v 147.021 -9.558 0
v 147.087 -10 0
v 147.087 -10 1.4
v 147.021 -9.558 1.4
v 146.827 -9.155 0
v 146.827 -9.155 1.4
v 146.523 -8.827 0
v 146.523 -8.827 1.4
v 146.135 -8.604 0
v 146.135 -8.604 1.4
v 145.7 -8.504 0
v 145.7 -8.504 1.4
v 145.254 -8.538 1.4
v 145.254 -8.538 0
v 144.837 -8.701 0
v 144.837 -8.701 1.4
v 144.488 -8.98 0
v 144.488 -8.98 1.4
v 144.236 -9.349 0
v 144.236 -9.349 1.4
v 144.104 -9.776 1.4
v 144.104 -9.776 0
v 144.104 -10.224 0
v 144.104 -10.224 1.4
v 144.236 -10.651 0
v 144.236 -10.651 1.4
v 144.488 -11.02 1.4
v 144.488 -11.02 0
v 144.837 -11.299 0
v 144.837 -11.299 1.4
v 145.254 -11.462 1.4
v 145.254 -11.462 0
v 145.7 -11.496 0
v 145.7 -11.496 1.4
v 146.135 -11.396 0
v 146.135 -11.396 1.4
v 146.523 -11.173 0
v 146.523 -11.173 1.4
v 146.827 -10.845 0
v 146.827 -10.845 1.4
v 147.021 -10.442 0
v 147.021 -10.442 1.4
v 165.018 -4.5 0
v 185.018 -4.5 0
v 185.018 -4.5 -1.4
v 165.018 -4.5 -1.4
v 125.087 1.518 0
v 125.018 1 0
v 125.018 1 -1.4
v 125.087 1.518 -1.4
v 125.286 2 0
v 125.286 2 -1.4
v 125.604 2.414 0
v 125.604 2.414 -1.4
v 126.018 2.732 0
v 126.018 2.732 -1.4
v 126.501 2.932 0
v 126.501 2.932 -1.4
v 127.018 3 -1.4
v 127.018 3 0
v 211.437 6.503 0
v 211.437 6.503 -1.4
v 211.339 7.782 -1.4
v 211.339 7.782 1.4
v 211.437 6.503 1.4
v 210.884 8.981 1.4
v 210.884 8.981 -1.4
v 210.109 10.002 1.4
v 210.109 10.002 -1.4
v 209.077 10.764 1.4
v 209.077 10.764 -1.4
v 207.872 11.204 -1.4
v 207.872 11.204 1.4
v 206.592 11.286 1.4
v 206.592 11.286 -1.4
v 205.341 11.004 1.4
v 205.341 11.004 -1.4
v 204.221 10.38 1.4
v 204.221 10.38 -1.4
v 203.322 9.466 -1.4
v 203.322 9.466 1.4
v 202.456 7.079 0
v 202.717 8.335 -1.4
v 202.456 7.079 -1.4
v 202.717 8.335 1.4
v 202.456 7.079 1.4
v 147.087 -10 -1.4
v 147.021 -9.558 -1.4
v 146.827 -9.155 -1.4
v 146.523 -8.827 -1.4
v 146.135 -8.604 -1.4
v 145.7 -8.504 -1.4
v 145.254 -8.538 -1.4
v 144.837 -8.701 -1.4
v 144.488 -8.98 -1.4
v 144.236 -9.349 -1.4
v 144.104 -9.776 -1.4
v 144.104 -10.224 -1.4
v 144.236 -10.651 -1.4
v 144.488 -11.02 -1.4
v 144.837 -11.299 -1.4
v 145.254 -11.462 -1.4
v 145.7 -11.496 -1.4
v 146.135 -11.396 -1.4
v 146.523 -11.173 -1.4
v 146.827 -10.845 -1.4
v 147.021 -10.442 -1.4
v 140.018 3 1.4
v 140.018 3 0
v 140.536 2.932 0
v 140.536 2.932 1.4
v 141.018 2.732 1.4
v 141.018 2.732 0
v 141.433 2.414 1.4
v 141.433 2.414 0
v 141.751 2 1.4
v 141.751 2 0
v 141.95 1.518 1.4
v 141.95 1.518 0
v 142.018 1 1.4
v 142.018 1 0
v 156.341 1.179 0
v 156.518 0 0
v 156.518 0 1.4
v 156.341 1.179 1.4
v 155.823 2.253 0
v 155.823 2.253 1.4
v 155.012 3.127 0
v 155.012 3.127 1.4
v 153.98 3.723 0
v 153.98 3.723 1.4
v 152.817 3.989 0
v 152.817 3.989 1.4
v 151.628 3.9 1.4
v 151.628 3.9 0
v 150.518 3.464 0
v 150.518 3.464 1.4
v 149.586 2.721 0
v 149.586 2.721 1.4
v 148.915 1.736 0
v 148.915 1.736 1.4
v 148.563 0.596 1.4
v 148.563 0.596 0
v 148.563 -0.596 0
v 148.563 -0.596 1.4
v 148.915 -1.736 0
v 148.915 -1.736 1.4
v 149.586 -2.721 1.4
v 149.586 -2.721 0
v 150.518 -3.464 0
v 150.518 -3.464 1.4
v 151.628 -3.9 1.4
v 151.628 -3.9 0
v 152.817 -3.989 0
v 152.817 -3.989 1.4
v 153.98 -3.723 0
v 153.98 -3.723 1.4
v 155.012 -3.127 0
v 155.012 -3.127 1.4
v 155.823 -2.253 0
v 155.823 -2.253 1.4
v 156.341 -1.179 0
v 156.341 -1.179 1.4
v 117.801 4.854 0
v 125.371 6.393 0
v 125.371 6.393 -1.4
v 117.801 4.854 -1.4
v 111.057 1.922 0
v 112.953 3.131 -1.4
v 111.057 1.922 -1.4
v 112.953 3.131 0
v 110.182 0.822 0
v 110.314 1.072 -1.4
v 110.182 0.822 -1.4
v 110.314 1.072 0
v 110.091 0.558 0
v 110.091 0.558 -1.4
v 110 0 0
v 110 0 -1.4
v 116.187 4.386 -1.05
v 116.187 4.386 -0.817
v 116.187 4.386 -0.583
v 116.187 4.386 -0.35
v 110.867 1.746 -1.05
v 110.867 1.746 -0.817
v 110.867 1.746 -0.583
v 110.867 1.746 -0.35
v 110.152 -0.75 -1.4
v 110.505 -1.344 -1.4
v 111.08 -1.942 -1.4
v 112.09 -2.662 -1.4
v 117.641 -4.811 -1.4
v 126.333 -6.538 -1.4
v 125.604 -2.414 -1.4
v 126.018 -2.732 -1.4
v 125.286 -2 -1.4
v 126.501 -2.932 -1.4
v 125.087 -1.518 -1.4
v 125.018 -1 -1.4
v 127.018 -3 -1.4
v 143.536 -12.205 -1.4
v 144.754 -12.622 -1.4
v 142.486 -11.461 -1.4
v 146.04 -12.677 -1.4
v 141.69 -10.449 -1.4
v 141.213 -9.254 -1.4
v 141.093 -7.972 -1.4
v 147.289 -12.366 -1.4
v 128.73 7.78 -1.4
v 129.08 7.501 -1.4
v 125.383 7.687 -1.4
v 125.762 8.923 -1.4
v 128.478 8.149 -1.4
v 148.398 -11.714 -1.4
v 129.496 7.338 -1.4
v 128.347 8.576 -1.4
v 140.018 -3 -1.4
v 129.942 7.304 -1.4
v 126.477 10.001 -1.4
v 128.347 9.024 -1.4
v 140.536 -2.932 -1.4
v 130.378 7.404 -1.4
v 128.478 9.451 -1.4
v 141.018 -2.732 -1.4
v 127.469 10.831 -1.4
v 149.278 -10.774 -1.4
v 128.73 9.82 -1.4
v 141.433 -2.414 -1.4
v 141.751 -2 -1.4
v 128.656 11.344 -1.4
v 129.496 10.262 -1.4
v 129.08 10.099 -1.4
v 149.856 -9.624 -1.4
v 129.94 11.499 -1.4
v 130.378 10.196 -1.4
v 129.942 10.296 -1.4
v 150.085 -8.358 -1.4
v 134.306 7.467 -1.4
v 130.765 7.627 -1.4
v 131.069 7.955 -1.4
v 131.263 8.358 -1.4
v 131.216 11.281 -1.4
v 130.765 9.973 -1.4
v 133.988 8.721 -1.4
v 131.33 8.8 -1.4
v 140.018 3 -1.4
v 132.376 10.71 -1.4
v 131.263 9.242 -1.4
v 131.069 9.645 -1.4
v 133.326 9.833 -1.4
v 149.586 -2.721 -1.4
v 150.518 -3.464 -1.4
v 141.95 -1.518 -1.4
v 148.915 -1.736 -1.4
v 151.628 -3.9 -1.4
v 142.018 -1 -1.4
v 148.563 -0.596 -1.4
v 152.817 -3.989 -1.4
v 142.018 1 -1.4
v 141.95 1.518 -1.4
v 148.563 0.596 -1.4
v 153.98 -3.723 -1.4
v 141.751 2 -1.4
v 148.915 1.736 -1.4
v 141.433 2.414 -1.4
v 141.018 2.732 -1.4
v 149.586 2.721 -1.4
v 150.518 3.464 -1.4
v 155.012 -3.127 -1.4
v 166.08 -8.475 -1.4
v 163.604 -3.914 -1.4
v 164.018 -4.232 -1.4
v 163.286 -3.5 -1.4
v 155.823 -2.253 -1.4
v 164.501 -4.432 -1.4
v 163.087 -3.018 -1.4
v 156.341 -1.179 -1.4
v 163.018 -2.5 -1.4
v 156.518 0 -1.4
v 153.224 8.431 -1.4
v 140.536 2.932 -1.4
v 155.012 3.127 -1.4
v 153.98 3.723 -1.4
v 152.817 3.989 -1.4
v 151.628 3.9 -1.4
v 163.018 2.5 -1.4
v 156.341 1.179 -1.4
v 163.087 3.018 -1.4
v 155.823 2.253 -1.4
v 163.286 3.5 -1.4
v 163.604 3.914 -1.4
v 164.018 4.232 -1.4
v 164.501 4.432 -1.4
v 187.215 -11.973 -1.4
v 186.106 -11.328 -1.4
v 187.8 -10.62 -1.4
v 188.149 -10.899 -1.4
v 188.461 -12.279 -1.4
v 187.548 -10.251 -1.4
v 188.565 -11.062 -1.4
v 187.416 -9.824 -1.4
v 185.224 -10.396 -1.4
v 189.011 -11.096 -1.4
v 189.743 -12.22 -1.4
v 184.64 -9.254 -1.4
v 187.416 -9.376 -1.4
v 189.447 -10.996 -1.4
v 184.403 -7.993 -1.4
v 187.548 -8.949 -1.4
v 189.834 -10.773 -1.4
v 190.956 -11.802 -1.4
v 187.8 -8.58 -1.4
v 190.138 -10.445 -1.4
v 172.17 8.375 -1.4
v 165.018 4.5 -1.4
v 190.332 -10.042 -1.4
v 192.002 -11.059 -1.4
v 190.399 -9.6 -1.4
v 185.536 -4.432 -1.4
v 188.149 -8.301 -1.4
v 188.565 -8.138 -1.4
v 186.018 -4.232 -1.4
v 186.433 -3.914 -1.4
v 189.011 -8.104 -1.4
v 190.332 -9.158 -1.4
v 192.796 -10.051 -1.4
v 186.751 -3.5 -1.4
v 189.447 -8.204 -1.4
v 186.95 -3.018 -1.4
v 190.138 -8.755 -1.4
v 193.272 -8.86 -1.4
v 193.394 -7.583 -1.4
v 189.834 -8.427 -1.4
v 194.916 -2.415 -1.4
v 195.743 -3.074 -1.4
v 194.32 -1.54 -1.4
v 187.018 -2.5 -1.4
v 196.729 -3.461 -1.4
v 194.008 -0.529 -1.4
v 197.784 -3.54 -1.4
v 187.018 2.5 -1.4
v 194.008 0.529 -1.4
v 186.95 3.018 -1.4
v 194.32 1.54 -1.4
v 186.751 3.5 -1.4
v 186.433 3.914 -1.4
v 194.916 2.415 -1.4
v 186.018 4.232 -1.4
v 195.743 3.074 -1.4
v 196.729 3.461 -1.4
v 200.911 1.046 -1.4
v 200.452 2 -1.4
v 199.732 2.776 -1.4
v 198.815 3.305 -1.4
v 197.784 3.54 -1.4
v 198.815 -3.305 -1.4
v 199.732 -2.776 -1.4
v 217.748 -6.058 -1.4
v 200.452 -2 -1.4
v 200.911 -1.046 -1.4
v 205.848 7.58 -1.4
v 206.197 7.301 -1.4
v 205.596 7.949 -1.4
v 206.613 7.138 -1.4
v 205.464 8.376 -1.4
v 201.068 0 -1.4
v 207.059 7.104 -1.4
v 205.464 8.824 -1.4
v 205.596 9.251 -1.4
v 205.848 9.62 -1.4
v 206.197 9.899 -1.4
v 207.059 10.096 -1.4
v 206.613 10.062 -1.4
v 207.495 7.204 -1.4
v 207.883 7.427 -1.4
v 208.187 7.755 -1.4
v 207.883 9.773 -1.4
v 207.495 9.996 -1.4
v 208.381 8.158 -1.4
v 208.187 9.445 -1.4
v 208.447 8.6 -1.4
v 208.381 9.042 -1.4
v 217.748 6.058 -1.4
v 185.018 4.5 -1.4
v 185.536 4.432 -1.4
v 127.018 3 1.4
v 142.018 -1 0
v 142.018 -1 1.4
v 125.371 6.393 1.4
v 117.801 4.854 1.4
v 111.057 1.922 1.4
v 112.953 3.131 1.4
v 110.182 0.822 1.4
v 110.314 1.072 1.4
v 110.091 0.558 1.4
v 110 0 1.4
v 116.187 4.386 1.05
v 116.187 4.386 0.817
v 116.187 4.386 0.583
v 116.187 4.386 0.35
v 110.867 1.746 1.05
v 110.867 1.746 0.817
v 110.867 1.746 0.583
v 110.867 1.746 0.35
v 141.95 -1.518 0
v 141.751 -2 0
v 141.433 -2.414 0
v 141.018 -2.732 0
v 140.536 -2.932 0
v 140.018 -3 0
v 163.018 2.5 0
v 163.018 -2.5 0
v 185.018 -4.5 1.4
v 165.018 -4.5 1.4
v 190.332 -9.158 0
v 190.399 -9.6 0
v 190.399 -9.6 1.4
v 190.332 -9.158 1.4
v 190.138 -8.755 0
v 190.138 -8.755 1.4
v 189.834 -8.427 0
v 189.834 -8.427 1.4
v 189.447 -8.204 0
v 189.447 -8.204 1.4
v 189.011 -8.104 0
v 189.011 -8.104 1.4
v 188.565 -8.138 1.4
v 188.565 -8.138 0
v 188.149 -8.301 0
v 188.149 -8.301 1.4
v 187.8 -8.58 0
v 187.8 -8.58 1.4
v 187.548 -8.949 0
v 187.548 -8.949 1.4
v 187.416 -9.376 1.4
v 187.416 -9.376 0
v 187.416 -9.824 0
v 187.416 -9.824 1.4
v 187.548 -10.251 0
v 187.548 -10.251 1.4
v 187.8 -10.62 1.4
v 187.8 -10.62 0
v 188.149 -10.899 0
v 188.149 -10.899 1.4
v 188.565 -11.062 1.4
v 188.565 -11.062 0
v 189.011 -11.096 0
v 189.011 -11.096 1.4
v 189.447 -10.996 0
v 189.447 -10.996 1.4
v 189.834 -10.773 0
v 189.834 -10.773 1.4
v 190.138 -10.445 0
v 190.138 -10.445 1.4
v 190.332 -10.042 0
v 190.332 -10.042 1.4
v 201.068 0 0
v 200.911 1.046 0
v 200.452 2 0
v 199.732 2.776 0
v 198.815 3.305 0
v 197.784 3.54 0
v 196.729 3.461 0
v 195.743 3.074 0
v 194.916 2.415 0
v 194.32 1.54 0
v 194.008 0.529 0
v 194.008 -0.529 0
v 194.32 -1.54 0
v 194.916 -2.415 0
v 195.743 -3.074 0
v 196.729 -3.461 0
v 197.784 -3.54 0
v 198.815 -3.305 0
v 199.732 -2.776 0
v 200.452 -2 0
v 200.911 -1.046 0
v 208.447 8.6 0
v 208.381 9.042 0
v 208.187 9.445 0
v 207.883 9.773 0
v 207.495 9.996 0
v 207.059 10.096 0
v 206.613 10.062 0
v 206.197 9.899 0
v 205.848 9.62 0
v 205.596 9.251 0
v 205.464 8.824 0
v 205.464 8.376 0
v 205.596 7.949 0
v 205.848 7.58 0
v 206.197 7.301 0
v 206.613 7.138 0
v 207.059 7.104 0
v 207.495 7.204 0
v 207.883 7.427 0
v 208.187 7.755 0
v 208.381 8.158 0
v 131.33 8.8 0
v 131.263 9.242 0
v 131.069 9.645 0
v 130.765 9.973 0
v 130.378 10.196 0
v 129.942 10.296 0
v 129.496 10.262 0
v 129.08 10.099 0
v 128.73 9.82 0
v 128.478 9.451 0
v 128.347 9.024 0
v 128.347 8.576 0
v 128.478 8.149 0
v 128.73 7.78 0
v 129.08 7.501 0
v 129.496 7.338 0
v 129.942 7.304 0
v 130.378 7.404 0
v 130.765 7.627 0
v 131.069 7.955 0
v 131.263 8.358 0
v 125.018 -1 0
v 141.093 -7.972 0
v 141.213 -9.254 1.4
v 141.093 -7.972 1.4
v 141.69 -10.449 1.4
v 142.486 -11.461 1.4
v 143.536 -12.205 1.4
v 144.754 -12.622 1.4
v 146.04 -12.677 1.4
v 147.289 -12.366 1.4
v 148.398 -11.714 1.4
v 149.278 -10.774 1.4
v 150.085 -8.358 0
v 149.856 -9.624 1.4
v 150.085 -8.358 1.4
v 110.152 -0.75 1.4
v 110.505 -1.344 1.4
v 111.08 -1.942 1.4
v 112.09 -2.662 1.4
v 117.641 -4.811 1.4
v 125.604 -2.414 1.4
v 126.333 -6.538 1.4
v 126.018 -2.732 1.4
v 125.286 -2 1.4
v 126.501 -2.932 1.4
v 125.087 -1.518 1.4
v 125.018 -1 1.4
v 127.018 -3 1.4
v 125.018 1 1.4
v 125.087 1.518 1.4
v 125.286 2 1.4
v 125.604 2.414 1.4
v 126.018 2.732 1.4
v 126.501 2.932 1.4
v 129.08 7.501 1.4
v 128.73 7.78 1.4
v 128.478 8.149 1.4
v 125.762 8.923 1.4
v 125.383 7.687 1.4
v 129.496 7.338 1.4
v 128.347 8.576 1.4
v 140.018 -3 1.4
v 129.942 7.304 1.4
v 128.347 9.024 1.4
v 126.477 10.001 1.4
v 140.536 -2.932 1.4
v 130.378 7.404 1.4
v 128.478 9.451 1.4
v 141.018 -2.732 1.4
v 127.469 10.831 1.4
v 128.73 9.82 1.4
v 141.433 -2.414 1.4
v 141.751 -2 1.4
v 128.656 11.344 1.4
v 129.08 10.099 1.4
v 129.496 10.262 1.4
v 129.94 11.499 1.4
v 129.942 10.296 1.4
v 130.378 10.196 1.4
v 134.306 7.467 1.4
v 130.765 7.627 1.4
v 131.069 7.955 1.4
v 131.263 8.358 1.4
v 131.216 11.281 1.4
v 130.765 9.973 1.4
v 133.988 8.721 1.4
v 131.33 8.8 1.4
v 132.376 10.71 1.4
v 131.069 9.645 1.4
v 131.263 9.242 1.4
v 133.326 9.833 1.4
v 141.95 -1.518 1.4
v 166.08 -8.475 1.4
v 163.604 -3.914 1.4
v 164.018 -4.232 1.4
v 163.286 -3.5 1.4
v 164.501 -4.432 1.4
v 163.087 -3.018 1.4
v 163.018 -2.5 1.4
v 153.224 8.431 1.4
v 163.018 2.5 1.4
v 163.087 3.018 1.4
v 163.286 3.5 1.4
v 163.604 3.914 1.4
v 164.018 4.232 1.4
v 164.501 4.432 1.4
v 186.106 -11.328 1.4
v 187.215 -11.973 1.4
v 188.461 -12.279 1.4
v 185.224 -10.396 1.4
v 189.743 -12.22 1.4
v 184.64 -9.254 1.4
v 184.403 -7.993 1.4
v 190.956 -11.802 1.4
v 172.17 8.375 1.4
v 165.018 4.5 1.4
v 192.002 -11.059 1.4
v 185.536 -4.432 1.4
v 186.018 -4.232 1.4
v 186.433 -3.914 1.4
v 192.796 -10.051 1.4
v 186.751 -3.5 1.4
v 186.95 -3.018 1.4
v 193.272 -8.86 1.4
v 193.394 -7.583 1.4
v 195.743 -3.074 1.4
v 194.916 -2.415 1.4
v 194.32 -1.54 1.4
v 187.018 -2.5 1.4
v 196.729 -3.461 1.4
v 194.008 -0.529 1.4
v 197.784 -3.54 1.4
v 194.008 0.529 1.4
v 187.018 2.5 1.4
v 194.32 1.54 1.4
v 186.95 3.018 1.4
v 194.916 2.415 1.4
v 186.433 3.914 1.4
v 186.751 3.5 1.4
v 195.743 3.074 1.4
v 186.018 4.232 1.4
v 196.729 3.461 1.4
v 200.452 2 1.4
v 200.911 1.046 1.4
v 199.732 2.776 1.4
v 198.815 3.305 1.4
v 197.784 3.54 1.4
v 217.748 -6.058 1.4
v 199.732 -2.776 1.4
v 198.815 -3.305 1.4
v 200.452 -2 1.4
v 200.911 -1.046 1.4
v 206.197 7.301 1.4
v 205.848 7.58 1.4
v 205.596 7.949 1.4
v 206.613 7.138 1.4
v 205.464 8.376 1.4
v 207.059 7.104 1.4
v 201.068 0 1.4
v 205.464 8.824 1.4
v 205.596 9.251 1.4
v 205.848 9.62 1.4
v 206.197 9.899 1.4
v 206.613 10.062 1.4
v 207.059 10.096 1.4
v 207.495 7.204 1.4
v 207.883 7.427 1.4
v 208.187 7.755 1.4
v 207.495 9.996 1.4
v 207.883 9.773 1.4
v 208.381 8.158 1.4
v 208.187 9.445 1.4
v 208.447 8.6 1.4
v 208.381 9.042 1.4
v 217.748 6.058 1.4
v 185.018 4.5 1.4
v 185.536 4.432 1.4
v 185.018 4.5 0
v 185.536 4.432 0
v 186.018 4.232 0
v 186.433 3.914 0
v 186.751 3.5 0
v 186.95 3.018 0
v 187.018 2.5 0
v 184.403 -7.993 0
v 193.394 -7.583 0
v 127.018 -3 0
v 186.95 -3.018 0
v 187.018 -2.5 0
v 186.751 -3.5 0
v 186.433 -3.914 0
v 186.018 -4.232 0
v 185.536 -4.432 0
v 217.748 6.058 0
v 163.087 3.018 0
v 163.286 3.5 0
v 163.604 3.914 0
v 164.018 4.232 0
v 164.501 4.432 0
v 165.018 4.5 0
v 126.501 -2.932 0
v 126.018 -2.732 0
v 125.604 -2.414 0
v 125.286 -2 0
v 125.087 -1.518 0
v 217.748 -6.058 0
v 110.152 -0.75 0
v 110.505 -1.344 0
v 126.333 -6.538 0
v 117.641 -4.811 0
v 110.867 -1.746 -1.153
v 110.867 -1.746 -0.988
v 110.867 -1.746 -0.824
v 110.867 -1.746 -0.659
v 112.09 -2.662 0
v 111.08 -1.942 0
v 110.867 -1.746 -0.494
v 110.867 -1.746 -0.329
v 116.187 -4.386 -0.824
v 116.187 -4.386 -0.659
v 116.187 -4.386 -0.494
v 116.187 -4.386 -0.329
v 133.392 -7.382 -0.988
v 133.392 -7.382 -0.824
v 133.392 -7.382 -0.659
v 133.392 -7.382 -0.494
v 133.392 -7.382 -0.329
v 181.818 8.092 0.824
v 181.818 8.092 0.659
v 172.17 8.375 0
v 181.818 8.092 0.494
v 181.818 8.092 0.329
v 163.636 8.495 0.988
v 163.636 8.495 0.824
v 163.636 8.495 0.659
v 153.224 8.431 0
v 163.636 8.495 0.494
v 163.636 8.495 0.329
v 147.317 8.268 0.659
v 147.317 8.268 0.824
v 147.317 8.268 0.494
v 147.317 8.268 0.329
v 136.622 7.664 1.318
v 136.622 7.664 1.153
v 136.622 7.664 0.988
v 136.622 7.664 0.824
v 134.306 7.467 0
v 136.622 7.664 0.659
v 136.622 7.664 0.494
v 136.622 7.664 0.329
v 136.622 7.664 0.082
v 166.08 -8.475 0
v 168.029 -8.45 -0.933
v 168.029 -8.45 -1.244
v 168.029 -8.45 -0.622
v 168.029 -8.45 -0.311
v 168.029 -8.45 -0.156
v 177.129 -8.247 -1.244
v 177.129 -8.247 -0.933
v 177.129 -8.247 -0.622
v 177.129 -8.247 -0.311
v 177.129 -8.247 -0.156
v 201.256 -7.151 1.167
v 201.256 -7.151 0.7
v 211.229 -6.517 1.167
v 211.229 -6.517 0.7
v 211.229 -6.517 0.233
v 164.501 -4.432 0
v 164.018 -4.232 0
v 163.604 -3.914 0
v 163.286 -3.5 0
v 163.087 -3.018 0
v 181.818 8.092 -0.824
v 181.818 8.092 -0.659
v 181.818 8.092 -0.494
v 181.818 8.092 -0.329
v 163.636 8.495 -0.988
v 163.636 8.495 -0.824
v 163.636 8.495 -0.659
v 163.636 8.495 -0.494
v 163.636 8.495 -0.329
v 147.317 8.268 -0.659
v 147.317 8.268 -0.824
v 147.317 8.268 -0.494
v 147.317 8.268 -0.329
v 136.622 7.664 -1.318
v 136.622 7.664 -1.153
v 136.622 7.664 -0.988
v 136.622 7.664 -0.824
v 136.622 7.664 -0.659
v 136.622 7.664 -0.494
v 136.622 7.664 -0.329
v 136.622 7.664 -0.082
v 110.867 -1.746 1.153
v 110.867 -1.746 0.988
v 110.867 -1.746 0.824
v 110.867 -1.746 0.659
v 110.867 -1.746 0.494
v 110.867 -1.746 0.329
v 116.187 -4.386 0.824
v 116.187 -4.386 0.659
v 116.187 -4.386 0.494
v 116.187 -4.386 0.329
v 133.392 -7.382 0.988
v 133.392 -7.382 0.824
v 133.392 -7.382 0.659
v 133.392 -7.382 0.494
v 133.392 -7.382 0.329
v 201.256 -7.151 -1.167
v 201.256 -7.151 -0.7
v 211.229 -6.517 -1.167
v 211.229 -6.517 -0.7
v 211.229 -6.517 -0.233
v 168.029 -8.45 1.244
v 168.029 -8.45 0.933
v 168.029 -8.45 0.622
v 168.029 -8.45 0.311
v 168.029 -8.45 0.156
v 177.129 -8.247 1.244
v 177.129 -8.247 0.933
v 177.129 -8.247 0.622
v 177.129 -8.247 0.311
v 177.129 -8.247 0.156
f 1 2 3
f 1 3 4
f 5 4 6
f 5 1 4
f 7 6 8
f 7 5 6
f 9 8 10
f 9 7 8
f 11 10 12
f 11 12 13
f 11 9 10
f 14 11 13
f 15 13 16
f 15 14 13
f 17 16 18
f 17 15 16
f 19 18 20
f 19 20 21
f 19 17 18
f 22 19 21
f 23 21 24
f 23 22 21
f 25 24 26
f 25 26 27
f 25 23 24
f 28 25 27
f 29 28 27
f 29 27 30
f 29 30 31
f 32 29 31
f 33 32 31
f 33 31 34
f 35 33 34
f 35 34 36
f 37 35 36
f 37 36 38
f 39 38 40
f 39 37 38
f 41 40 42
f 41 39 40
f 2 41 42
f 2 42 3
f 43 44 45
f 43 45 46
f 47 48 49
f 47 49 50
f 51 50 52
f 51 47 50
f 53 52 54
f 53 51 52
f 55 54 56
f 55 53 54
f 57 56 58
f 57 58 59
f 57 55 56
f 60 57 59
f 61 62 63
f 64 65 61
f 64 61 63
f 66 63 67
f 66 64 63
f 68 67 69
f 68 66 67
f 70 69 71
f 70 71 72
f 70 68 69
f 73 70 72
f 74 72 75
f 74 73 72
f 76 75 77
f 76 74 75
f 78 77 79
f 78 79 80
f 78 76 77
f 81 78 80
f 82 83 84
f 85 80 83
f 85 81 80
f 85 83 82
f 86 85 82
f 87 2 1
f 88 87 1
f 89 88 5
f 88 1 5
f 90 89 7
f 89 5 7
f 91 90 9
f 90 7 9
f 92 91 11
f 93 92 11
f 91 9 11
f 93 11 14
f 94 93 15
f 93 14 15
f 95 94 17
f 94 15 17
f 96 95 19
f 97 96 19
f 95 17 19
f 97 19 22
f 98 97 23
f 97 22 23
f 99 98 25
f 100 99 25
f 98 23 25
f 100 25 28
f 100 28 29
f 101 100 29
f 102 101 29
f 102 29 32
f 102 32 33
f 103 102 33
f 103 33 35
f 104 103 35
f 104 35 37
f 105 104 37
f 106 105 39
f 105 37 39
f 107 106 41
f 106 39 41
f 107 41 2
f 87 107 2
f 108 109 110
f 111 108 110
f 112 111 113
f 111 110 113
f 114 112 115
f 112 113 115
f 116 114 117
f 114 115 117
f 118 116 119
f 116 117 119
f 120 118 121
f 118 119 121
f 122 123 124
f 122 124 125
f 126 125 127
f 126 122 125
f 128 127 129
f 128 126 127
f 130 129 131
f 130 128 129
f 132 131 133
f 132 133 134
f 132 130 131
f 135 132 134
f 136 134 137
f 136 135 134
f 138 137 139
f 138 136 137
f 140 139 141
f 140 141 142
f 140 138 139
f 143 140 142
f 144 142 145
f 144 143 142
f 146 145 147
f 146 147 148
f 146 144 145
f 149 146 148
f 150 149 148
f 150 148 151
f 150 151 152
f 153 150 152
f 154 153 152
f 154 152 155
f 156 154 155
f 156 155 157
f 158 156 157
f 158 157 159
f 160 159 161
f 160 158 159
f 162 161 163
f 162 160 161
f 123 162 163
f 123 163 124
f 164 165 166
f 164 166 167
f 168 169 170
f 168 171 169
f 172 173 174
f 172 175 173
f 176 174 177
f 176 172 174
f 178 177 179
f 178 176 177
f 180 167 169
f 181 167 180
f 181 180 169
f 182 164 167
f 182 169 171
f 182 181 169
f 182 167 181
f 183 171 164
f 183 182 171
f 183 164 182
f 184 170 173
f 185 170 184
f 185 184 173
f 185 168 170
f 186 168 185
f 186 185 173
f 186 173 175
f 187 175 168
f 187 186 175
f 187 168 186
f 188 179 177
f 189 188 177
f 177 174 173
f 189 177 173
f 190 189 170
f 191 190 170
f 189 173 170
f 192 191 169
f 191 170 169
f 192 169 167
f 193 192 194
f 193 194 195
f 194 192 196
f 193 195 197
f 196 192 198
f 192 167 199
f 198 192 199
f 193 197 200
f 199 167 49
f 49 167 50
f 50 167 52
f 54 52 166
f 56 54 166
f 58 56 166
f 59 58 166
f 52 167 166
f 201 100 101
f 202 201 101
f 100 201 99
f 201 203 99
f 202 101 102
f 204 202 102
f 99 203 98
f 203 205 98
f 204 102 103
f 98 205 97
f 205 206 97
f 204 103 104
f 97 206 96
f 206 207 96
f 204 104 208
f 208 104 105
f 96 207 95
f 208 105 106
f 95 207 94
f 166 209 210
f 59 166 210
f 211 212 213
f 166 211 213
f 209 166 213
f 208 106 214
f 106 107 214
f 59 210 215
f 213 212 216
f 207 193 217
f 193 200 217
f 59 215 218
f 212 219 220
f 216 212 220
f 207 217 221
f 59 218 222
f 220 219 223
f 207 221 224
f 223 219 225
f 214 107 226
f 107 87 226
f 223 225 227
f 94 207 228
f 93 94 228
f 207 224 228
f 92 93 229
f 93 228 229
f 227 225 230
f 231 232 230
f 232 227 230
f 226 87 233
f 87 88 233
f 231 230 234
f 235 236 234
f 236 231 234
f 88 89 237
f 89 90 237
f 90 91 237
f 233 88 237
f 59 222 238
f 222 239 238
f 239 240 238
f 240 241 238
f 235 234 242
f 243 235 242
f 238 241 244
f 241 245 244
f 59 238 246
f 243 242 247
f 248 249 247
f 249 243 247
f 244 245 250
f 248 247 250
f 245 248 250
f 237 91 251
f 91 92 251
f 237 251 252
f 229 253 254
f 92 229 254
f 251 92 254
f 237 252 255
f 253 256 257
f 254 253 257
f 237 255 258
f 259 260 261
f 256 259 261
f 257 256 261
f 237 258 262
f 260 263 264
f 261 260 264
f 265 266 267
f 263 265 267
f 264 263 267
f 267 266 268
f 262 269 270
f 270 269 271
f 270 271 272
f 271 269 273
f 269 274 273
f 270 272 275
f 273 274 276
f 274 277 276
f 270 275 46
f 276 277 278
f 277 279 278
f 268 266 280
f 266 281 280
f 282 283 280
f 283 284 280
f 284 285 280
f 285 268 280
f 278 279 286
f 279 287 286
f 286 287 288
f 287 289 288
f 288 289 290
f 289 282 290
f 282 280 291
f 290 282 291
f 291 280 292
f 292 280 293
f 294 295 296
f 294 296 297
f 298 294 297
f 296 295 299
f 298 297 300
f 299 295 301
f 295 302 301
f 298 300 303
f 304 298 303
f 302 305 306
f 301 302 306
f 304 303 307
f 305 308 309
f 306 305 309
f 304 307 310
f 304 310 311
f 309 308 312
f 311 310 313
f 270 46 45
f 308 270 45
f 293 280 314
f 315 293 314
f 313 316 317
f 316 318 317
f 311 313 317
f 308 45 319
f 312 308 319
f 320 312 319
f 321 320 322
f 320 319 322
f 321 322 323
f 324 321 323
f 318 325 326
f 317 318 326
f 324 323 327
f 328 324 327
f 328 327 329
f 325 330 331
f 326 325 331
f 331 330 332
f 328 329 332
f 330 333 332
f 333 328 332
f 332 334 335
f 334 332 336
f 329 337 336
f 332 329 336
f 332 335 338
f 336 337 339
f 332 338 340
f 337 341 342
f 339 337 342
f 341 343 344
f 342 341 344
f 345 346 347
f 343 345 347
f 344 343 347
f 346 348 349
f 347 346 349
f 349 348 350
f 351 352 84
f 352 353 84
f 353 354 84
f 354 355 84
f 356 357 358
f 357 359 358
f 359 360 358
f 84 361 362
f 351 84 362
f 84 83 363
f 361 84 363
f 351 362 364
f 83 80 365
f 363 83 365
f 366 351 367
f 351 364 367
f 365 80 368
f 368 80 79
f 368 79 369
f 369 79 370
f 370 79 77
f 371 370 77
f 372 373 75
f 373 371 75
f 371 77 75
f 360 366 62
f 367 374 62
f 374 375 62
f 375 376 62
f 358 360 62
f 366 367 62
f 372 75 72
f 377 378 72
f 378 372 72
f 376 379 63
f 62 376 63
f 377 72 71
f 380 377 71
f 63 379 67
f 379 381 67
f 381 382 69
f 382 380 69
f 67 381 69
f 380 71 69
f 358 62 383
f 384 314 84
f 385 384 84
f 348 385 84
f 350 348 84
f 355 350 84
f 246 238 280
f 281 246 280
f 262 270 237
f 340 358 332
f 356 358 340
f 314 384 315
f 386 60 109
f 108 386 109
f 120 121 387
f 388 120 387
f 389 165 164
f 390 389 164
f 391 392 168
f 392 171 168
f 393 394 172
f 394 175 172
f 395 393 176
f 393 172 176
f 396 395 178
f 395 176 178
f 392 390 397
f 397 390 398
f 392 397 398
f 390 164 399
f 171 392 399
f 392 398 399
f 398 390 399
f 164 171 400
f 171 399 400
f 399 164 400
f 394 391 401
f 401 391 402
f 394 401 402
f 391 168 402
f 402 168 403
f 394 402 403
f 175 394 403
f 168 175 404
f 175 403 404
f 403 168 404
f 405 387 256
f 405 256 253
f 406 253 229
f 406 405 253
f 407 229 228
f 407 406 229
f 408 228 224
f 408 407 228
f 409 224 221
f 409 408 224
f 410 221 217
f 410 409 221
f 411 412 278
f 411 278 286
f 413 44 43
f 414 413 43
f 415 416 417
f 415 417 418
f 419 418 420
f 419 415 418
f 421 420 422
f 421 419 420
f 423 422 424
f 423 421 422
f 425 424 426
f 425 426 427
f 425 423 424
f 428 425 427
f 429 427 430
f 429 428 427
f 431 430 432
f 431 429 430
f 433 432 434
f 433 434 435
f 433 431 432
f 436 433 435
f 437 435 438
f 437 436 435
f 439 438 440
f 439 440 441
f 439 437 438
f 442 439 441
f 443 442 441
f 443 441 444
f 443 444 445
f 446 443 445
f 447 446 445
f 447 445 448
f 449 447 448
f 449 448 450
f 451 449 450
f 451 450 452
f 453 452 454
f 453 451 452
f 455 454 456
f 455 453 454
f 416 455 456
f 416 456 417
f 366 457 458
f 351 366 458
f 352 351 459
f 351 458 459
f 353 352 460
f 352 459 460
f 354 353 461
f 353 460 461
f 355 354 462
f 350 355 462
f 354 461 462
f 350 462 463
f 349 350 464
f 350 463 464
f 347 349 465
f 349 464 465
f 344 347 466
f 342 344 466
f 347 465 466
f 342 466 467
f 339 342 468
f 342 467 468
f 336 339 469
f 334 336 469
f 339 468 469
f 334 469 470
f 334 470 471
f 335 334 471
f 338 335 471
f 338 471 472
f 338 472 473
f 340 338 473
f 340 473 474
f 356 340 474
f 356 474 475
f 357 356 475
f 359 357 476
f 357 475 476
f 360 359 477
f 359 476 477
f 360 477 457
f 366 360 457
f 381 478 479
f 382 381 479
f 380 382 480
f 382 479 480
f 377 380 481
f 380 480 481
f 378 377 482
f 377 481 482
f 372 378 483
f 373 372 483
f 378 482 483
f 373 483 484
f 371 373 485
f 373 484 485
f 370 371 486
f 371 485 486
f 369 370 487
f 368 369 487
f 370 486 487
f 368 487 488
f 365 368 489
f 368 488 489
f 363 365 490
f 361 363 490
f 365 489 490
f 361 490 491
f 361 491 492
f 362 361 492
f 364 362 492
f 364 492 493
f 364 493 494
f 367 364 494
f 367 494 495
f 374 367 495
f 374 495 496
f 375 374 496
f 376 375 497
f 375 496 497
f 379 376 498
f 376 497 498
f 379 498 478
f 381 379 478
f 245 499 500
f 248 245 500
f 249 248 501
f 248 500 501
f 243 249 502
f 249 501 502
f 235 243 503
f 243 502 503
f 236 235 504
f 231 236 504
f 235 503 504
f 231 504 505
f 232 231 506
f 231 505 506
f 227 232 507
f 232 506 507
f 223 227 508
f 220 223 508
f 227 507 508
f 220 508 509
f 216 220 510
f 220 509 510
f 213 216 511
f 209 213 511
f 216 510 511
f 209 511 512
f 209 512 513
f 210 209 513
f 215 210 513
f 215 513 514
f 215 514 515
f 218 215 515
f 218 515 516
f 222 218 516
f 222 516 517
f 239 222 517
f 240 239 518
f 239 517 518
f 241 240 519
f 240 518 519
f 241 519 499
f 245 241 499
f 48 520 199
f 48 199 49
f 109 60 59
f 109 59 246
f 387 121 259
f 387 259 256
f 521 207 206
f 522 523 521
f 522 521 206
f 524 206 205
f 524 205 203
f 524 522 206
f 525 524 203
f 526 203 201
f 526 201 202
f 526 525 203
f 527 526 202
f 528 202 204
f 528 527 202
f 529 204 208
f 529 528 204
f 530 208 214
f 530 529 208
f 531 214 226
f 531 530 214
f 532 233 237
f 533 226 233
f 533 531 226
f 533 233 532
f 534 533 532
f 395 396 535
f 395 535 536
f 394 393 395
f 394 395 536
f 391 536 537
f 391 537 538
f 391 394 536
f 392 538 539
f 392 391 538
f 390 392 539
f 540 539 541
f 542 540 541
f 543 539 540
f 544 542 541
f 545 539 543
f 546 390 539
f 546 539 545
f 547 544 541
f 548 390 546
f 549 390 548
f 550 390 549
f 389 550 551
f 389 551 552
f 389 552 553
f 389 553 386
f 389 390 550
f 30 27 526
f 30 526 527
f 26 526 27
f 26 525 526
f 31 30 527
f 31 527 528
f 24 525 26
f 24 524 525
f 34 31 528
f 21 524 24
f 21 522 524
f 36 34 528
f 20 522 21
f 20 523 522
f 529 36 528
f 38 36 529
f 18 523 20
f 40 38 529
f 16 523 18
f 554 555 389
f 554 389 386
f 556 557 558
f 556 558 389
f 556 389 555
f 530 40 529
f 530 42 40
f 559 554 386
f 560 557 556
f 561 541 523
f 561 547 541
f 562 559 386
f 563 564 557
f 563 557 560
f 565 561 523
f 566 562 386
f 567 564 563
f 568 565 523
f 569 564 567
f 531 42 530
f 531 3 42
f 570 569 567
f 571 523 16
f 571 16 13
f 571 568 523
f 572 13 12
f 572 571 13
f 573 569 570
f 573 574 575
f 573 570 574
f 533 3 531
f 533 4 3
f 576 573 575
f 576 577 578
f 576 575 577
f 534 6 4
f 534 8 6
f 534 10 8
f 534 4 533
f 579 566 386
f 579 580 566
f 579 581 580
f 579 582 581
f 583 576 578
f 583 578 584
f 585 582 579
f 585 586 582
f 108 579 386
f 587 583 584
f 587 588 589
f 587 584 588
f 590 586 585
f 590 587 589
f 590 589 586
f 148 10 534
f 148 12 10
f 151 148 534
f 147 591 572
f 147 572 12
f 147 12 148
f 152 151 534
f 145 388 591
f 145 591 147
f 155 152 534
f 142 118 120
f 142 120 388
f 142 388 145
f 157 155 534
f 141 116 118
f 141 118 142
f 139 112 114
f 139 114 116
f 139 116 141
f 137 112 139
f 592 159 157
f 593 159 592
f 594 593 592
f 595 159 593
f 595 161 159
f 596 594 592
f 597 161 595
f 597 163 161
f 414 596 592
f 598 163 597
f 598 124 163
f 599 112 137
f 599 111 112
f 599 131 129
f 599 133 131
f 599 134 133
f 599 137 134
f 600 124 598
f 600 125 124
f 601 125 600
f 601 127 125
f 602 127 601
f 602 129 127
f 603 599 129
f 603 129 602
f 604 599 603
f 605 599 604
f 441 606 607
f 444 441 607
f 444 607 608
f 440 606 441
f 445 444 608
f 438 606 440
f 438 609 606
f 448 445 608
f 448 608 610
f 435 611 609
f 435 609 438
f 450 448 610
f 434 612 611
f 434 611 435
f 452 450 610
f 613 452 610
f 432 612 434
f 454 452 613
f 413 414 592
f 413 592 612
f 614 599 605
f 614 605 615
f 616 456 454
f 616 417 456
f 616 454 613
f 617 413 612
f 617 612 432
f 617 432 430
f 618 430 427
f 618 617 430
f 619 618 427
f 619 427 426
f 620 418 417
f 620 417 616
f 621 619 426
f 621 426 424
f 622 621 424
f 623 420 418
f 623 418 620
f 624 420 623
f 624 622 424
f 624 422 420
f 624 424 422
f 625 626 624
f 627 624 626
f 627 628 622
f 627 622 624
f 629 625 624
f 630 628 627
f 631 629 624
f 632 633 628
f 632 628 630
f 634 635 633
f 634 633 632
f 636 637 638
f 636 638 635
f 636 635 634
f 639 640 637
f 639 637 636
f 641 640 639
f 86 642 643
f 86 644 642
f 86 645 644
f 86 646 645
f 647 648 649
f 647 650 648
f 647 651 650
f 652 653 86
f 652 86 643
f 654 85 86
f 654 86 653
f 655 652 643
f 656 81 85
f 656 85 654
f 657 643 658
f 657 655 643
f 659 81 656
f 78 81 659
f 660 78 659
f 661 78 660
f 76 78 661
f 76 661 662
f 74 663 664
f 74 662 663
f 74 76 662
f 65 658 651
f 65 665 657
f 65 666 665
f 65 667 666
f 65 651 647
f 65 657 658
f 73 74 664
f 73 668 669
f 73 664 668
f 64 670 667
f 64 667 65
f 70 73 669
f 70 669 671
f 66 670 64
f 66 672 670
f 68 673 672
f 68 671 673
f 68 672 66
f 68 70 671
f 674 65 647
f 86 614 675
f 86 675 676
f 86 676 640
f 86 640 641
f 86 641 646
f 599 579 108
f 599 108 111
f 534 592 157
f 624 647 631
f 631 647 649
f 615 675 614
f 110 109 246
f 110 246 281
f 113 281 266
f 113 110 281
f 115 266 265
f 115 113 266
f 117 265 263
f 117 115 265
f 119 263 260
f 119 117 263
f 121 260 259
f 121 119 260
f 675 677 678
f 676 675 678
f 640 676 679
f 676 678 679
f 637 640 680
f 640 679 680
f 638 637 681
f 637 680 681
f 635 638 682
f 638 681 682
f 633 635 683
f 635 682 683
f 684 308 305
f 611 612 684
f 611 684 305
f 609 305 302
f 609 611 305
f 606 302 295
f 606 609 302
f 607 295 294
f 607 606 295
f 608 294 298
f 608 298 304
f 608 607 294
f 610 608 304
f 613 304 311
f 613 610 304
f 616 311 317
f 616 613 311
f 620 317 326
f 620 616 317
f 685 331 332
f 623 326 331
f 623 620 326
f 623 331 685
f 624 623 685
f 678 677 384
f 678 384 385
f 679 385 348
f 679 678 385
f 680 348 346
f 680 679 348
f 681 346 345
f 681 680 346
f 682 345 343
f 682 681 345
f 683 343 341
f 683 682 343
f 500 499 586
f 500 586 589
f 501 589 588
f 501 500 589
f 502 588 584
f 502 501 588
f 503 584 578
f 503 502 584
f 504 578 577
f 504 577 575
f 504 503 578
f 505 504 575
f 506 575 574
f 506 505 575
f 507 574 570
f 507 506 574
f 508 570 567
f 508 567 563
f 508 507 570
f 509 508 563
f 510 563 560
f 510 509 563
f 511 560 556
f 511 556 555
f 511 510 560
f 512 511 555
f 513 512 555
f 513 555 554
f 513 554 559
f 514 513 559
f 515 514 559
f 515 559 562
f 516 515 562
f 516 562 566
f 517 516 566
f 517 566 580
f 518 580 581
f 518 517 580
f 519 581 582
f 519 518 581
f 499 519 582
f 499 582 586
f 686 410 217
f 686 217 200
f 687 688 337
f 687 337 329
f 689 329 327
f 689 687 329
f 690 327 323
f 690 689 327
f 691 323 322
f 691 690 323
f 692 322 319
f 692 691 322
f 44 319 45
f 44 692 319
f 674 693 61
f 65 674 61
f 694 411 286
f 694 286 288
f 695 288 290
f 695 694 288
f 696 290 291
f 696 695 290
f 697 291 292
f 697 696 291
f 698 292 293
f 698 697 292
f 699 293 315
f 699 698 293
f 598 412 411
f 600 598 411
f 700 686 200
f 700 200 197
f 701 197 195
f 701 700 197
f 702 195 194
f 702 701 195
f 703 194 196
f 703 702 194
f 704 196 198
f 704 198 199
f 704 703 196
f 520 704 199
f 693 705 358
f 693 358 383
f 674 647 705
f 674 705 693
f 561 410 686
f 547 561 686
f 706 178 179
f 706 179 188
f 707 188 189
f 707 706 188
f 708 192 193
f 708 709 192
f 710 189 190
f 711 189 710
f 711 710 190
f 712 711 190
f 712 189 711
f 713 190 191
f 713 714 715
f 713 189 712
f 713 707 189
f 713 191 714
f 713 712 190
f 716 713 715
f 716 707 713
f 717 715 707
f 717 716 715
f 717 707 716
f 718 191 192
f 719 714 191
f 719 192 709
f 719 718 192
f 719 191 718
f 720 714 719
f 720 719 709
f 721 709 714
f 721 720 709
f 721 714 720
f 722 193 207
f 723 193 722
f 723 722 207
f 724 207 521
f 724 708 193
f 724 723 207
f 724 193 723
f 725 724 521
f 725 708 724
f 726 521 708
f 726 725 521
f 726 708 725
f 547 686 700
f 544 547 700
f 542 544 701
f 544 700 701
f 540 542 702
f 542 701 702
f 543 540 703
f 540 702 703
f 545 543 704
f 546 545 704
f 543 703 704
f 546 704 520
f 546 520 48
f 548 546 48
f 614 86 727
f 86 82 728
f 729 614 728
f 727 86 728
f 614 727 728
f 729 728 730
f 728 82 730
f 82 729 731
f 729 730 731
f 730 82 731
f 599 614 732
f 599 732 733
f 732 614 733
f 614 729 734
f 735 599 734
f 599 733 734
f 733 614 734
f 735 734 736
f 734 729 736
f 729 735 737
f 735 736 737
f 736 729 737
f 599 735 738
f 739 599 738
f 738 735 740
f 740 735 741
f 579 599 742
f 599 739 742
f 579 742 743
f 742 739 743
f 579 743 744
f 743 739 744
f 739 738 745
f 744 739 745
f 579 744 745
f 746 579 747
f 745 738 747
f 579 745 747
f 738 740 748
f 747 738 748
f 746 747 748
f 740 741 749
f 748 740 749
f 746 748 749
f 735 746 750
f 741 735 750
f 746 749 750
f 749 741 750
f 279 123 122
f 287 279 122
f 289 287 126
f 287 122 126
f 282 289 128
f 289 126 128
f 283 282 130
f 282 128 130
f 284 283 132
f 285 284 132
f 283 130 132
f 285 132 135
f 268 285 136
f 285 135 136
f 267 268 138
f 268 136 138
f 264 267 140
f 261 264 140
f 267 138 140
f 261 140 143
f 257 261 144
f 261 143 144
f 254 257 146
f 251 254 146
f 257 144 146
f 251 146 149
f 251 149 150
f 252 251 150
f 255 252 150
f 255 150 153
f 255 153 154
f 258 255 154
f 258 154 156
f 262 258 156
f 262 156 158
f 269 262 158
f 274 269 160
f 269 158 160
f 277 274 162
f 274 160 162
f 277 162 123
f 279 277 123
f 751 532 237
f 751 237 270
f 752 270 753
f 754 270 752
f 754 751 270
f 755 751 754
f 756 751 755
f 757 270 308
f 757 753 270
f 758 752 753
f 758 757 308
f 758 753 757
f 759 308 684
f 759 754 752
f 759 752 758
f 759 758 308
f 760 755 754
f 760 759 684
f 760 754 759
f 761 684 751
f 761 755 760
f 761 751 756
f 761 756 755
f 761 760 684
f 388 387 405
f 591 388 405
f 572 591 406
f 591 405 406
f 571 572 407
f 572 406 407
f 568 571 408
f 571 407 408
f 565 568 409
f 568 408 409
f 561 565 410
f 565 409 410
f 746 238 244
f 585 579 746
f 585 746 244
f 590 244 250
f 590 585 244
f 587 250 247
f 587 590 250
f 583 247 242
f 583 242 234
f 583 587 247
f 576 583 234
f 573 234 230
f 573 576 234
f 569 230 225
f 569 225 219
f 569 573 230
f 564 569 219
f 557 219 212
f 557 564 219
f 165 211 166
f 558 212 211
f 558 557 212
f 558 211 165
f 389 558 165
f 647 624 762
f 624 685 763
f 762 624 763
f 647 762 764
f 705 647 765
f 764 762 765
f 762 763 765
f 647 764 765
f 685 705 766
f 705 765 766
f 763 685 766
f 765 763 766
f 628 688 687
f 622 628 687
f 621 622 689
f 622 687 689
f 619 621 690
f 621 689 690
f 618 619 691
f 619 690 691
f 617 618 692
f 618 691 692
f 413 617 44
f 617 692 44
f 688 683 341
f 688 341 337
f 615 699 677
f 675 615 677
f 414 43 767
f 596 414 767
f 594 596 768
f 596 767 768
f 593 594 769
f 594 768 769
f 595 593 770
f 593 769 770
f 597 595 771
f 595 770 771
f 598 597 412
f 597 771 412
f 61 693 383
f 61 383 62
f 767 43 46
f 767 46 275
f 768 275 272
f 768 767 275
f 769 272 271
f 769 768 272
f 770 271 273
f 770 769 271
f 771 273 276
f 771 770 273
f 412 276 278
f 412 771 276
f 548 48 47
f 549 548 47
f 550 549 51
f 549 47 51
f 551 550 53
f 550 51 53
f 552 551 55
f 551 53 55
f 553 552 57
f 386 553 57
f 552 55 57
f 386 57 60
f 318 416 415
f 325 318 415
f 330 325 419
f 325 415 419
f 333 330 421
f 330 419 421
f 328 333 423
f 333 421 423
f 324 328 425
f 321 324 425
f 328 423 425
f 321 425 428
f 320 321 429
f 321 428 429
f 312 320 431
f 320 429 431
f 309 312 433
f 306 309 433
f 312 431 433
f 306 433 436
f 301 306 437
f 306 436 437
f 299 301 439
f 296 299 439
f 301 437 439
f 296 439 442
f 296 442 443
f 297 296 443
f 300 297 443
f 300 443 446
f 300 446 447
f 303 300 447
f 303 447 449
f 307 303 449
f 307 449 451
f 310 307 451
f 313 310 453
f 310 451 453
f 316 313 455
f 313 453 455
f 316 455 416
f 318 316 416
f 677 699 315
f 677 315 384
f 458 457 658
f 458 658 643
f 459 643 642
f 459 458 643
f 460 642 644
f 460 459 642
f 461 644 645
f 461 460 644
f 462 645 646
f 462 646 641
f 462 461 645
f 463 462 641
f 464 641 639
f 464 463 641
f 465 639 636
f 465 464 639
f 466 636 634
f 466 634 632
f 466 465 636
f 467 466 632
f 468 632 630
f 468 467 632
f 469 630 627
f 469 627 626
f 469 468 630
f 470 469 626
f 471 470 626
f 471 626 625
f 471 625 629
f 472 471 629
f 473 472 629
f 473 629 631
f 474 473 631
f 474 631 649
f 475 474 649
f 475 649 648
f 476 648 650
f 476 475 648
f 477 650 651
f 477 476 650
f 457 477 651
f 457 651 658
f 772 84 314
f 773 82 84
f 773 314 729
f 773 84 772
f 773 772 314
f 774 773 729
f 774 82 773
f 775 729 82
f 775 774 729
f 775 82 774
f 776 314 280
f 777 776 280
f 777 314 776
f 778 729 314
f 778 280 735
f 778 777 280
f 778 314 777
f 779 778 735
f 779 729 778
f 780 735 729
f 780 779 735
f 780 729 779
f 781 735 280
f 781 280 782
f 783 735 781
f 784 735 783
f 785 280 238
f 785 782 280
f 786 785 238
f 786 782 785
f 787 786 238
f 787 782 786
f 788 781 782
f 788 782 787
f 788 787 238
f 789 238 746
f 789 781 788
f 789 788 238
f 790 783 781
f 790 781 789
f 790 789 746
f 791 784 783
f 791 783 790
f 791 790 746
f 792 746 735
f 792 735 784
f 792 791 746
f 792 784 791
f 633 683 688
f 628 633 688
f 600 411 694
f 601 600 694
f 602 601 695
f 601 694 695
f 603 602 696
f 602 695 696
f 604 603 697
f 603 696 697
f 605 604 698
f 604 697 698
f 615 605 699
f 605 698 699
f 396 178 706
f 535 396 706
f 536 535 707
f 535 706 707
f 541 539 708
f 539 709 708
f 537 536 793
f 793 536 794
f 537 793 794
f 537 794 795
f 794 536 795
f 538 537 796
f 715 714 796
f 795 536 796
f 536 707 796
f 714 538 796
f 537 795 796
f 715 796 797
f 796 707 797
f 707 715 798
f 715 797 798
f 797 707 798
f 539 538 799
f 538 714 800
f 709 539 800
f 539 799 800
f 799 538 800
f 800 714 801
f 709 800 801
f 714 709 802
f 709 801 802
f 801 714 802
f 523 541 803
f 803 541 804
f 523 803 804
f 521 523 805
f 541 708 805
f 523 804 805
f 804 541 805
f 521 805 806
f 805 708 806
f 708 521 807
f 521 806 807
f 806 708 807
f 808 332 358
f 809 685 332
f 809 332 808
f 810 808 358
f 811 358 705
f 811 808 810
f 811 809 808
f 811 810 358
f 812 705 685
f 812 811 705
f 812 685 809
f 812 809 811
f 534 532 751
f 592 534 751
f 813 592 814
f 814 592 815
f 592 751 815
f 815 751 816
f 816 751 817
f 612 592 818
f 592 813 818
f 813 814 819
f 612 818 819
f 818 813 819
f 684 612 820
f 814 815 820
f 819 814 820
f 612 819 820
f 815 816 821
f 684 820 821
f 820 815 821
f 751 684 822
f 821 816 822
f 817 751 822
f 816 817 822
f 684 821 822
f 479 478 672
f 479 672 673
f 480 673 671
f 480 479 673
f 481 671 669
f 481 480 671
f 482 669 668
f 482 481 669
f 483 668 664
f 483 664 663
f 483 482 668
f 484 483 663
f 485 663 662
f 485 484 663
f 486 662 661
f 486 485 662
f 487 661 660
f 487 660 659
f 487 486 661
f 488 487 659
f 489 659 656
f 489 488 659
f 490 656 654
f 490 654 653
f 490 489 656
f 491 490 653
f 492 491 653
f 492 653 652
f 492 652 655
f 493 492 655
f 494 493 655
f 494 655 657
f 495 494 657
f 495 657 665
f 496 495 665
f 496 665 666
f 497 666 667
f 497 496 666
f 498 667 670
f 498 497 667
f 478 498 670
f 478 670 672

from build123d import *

# Parameters (mm, degrees)
SKETCH_1_R      = 1.5
SKETCH_1_R_2    = 4
SKETCH_1_R_3    = 3.55
EXTRUDE_1_DEPTH = 1.4


with BuildPart() as part:
    # Эскиз1 → Бобышка-Вытянуть1 (new, symmetric)
    with BuildSketch(Plane.XY):
        with BuildLine():
            Line((217.747634119, 0), (217.747634119, 6.058113078))
            add(Edge.make_bspline(
                [(217.747634119, 6.058113078), (217.243808474, 6.094887376), (215.140700226, 6.247183834), (213.037224342, 6.394367799), (211.437469318, 6.503148402)],
                knots=[0.362605011, 0.362605011, 0.362605011, 0.362605011, 0.371392651, 0.399285533, 0.399285533, 0.399285533, 0.399285533], degree=3))
            ThreePointArc((211.437469318, 6.503148402), (207.235292618, 11.29077317), (202.455940343, 7.079190122))
            add(Edge.make_bspline(
                [(202.455940343, 7.079190122), (202.056002141, 7.103223291), (200.009450225, 7.225045801), (196.331634567, 7.433105337), (191.441311474, 7.684604439), (186.608700127, 7.906218293), (181.844626933, 8.095958493), (177.159453511, 8.251957682), (172.563150272, 8.372486564), (168.065295924, 8.455953662), (163.675147454, 8.5010027), (159.401643404, 8.506522967), (155.253439756, 8.471528808), (151.238917925, 8.395506076), (147.366223919, 8.277985977), (143.643266298, 8.118975561), (140.077743555, 7.918678943), (136.982380939, 7.699243614), (135.077259612, 7.537606821), (134.305602735, 7.467259257)],
                knots=[0.451472212, 0.451472212, 0.451472212, 0.451472212, 0.458441906, 0.487136113, 0.515551917, 0.543623846, 0.571289984, 0.59849081, 0.625169613, 0.651272029, 0.676746158, 0.701541791, 0.725611017, 0.748907835, 0.771387785, 0.793008139, 0.813728033, 0.833507815, 0.846986731, 0.846986731, 0.846986731, 0.846986731], degree=3))
            ThreePointArc((134.305602735, 7.467259257), (129.292776458, 11.467825954), (125.371042184, 6.393088379))
            add(Edge.make_bspline(
                [(125.371042184, 6.393088379), (125.182557358, 6.363796993), (124.168294515, 6.203402144), (122.397158974, 5.896120566), (120.133109351, 5.434797476), (118.081312133, 4.94256764), (116.247665798, 4.421392386), (114.63793972, 3.873060465), (113.256788366, 3.299309237), (112.109835924, 2.701306387), (111.196336341, 2.078555233), (110.530223642, 1.427069758), (110.085538218, 0.73423022), (110.027578176, 0.23672144), (110, 0)],
                knots=[0.899174702, 0.899174702, 0.899174702, 0.899174702, 0.902492782, 0.917037139, 0.930441054, 0.942679762, 0.953733567, 0.963589785, 0.972247019, 0.979722225, 0.986065145, 0.991385258, 0.995900989, 1, 1, 1, 1], degree=3))
            add(Edge.make_bspline(
                [(110, 0), (110.027578176, -0.236721441), (110.085538218, -0.734230221), (110.530223642, -1.427069759), (111.196336341, -2.078555234), (112.109835924, -2.701306388), (113.256788366, -3.299309238), (114.63793972, -3.873060466), (116.247665798, -4.421392387), (118.081312133, -4.942567641), (120.133109351, -5.434797477), (122.397158974, -5.896120567), (124.867245825, -6.324666078), (127.536961089, -6.718650341), (130.399721686, -7.076424311), (133.448762895, -7.396480569), (136.677139412, -7.677604542), (139.245643336, -7.859689995), (140.736851964, -7.951317752), (141.093175889, -7.972438296)],
                knots=[0, 0, 0, 0, 0.004099011, 0.008614742, 0.013934855, 0.020277775, 0.027752981, 0.036410215, 0.046266433, 0.057320238, 0.069558946, 0.082962861, 0.097507218, 0.113164082, 0.12990269, 0.147690304, 0.166492185, 0.186271967, 0.192481252, 0.192481252, 0.192481252, 0.192481252], degree=3))
            ThreePointArc((141.093175889, -7.972438296), (145.394805922, -12.695875937), (150.084655985, -8.35765159))
            add(Edge.make_bspline(
                [(150.084655985, -8.35765159), (150.453806444, -8.367988388), (152.161758649, -8.412981849), (155.253439756, -8.471528808), (159.401643404, -8.506522967), (163.675147454, -8.5010027), (168.065295924, -8.455953663), (172.563150272, -8.372486564), (177.159453511, -8.251957682), (181.117095872, -8.120182624), (183.541473355, -8.027281081), (184.403269889, -7.992794251)],
                knots=[0.244668107, 0.244668107, 0.244668107, 0.244668107, 0.251092165, 0.274388983, 0.298458209, 0.323253842, 0.348727971, 0.374830387, 0.40150919, 0.428710016, 0.443713425, 0.443713425, 0.443713425, 0.443713425], degree=3))
            ThreePointArc((184.403269889, -7.992794251), (189.104065456, -12.29533144), (193.393900024, -7.582940899))
            add(Edge.make_bspline(
                [(193.393900024, -7.582940899), (194.367821921, -7.533422186), (196.98891626, -7.395921928), (201.268368917, -7.153826886), (206.239642946, -6.848873), (211.232977593, -6.52047435), (215.071311266, -6.252208631), (217.243808474, -6.094887376), (217.747634119, -6.058113078)],
                knots=[0.495900102, 0.495900102, 0.495900102, 0.495900102, 0.512863887, 0.541558094, 0.570462313, 0.599504248, 0.628607349, 0.637394989, 0.637394989, 0.637394989, 0.637394989], degree=3))
            Line((217.747634119, -6.058113078), (217.747634119, 0))
        make_face()
        with Locations((145.587418391, -10)):
            Circle(SKETCH_1_R, mode=Mode.SUBTRACT)
        with Locations((188.899138034, -9.6)):
            Circle(SKETCH_1_R, mode=Mode.SUBTRACT)
        with BuildLine():
            Line((140.01848428, -3), (127.01848428, -3))
            ThreePointArc((127.01848428, -3), (125.604270718, -2.414213562), (125.01848428, -1))
            Line((125.01848428, -1), (125.01848428, 1))
            ThreePointArc((125.01848428, 1), (125.604270718, 2.414213562), (127.01848428, 3))
            Line((127.01848428, 3), (140.01848428, 3))
            ThreePointArc((140.01848428, 3), (141.432697843, 2.414213562), (142.01848428, 1))
            Line((142.01848428, 1), (142.01848428, -1))
            ThreePointArc((142.01848428, -1), (141.432697843, -2.414213562), (140.01848428, -3))
        make_face(mode=Mode.SUBTRACT)
        with Locations((152.51848428, 0)):
            Circle(SKETCH_1_R_2, mode=Mode.SUBTRACT)
        with BuildLine():
            Line((185.01848428, -4.5), (165.01848428, -4.5))
            ThreePointArc((165.01848428, -4.5), (163.604270718, -3.914213562), (163.01848428, -2.5))
            Line((163.01848428, -2.5), (163.01848428, 2.5))
            ThreePointArc((163.01848428, 2.5), (163.604270718, 3.914213562), (165.01848428, 4.5))
            Line((165.01848428, 4.5), (185.01848428, 4.5))
            ThreePointArc((185.01848428, 4.5), (186.432697843, 3.914213562), (187.01848428, 2.5))
            Line((187.01848428, 2.5), (187.01848428, -2.5))
            ThreePointArc((187.01848428, -2.5), (186.432697843, -3.914213562), (185.01848428, -4.5))
        make_face(mode=Mode.SUBTRACT)
        with Locations((129.829927502, 8.8)):
            Circle(SKETCH_1_R, mode=Mode.SUBTRACT)
        with Locations((197.51848428, 0)):
            Circle(SKETCH_1_R_3, mode=Mode.SUBTRACT)
        with Locations((206.947271201, 8.6)):
            Circle(SKETCH_1_R, mode=Mode.SUBTRACT)
    extrude(amount=EXTRUDE_1_DEPTH, both=True)


solid = part.part
